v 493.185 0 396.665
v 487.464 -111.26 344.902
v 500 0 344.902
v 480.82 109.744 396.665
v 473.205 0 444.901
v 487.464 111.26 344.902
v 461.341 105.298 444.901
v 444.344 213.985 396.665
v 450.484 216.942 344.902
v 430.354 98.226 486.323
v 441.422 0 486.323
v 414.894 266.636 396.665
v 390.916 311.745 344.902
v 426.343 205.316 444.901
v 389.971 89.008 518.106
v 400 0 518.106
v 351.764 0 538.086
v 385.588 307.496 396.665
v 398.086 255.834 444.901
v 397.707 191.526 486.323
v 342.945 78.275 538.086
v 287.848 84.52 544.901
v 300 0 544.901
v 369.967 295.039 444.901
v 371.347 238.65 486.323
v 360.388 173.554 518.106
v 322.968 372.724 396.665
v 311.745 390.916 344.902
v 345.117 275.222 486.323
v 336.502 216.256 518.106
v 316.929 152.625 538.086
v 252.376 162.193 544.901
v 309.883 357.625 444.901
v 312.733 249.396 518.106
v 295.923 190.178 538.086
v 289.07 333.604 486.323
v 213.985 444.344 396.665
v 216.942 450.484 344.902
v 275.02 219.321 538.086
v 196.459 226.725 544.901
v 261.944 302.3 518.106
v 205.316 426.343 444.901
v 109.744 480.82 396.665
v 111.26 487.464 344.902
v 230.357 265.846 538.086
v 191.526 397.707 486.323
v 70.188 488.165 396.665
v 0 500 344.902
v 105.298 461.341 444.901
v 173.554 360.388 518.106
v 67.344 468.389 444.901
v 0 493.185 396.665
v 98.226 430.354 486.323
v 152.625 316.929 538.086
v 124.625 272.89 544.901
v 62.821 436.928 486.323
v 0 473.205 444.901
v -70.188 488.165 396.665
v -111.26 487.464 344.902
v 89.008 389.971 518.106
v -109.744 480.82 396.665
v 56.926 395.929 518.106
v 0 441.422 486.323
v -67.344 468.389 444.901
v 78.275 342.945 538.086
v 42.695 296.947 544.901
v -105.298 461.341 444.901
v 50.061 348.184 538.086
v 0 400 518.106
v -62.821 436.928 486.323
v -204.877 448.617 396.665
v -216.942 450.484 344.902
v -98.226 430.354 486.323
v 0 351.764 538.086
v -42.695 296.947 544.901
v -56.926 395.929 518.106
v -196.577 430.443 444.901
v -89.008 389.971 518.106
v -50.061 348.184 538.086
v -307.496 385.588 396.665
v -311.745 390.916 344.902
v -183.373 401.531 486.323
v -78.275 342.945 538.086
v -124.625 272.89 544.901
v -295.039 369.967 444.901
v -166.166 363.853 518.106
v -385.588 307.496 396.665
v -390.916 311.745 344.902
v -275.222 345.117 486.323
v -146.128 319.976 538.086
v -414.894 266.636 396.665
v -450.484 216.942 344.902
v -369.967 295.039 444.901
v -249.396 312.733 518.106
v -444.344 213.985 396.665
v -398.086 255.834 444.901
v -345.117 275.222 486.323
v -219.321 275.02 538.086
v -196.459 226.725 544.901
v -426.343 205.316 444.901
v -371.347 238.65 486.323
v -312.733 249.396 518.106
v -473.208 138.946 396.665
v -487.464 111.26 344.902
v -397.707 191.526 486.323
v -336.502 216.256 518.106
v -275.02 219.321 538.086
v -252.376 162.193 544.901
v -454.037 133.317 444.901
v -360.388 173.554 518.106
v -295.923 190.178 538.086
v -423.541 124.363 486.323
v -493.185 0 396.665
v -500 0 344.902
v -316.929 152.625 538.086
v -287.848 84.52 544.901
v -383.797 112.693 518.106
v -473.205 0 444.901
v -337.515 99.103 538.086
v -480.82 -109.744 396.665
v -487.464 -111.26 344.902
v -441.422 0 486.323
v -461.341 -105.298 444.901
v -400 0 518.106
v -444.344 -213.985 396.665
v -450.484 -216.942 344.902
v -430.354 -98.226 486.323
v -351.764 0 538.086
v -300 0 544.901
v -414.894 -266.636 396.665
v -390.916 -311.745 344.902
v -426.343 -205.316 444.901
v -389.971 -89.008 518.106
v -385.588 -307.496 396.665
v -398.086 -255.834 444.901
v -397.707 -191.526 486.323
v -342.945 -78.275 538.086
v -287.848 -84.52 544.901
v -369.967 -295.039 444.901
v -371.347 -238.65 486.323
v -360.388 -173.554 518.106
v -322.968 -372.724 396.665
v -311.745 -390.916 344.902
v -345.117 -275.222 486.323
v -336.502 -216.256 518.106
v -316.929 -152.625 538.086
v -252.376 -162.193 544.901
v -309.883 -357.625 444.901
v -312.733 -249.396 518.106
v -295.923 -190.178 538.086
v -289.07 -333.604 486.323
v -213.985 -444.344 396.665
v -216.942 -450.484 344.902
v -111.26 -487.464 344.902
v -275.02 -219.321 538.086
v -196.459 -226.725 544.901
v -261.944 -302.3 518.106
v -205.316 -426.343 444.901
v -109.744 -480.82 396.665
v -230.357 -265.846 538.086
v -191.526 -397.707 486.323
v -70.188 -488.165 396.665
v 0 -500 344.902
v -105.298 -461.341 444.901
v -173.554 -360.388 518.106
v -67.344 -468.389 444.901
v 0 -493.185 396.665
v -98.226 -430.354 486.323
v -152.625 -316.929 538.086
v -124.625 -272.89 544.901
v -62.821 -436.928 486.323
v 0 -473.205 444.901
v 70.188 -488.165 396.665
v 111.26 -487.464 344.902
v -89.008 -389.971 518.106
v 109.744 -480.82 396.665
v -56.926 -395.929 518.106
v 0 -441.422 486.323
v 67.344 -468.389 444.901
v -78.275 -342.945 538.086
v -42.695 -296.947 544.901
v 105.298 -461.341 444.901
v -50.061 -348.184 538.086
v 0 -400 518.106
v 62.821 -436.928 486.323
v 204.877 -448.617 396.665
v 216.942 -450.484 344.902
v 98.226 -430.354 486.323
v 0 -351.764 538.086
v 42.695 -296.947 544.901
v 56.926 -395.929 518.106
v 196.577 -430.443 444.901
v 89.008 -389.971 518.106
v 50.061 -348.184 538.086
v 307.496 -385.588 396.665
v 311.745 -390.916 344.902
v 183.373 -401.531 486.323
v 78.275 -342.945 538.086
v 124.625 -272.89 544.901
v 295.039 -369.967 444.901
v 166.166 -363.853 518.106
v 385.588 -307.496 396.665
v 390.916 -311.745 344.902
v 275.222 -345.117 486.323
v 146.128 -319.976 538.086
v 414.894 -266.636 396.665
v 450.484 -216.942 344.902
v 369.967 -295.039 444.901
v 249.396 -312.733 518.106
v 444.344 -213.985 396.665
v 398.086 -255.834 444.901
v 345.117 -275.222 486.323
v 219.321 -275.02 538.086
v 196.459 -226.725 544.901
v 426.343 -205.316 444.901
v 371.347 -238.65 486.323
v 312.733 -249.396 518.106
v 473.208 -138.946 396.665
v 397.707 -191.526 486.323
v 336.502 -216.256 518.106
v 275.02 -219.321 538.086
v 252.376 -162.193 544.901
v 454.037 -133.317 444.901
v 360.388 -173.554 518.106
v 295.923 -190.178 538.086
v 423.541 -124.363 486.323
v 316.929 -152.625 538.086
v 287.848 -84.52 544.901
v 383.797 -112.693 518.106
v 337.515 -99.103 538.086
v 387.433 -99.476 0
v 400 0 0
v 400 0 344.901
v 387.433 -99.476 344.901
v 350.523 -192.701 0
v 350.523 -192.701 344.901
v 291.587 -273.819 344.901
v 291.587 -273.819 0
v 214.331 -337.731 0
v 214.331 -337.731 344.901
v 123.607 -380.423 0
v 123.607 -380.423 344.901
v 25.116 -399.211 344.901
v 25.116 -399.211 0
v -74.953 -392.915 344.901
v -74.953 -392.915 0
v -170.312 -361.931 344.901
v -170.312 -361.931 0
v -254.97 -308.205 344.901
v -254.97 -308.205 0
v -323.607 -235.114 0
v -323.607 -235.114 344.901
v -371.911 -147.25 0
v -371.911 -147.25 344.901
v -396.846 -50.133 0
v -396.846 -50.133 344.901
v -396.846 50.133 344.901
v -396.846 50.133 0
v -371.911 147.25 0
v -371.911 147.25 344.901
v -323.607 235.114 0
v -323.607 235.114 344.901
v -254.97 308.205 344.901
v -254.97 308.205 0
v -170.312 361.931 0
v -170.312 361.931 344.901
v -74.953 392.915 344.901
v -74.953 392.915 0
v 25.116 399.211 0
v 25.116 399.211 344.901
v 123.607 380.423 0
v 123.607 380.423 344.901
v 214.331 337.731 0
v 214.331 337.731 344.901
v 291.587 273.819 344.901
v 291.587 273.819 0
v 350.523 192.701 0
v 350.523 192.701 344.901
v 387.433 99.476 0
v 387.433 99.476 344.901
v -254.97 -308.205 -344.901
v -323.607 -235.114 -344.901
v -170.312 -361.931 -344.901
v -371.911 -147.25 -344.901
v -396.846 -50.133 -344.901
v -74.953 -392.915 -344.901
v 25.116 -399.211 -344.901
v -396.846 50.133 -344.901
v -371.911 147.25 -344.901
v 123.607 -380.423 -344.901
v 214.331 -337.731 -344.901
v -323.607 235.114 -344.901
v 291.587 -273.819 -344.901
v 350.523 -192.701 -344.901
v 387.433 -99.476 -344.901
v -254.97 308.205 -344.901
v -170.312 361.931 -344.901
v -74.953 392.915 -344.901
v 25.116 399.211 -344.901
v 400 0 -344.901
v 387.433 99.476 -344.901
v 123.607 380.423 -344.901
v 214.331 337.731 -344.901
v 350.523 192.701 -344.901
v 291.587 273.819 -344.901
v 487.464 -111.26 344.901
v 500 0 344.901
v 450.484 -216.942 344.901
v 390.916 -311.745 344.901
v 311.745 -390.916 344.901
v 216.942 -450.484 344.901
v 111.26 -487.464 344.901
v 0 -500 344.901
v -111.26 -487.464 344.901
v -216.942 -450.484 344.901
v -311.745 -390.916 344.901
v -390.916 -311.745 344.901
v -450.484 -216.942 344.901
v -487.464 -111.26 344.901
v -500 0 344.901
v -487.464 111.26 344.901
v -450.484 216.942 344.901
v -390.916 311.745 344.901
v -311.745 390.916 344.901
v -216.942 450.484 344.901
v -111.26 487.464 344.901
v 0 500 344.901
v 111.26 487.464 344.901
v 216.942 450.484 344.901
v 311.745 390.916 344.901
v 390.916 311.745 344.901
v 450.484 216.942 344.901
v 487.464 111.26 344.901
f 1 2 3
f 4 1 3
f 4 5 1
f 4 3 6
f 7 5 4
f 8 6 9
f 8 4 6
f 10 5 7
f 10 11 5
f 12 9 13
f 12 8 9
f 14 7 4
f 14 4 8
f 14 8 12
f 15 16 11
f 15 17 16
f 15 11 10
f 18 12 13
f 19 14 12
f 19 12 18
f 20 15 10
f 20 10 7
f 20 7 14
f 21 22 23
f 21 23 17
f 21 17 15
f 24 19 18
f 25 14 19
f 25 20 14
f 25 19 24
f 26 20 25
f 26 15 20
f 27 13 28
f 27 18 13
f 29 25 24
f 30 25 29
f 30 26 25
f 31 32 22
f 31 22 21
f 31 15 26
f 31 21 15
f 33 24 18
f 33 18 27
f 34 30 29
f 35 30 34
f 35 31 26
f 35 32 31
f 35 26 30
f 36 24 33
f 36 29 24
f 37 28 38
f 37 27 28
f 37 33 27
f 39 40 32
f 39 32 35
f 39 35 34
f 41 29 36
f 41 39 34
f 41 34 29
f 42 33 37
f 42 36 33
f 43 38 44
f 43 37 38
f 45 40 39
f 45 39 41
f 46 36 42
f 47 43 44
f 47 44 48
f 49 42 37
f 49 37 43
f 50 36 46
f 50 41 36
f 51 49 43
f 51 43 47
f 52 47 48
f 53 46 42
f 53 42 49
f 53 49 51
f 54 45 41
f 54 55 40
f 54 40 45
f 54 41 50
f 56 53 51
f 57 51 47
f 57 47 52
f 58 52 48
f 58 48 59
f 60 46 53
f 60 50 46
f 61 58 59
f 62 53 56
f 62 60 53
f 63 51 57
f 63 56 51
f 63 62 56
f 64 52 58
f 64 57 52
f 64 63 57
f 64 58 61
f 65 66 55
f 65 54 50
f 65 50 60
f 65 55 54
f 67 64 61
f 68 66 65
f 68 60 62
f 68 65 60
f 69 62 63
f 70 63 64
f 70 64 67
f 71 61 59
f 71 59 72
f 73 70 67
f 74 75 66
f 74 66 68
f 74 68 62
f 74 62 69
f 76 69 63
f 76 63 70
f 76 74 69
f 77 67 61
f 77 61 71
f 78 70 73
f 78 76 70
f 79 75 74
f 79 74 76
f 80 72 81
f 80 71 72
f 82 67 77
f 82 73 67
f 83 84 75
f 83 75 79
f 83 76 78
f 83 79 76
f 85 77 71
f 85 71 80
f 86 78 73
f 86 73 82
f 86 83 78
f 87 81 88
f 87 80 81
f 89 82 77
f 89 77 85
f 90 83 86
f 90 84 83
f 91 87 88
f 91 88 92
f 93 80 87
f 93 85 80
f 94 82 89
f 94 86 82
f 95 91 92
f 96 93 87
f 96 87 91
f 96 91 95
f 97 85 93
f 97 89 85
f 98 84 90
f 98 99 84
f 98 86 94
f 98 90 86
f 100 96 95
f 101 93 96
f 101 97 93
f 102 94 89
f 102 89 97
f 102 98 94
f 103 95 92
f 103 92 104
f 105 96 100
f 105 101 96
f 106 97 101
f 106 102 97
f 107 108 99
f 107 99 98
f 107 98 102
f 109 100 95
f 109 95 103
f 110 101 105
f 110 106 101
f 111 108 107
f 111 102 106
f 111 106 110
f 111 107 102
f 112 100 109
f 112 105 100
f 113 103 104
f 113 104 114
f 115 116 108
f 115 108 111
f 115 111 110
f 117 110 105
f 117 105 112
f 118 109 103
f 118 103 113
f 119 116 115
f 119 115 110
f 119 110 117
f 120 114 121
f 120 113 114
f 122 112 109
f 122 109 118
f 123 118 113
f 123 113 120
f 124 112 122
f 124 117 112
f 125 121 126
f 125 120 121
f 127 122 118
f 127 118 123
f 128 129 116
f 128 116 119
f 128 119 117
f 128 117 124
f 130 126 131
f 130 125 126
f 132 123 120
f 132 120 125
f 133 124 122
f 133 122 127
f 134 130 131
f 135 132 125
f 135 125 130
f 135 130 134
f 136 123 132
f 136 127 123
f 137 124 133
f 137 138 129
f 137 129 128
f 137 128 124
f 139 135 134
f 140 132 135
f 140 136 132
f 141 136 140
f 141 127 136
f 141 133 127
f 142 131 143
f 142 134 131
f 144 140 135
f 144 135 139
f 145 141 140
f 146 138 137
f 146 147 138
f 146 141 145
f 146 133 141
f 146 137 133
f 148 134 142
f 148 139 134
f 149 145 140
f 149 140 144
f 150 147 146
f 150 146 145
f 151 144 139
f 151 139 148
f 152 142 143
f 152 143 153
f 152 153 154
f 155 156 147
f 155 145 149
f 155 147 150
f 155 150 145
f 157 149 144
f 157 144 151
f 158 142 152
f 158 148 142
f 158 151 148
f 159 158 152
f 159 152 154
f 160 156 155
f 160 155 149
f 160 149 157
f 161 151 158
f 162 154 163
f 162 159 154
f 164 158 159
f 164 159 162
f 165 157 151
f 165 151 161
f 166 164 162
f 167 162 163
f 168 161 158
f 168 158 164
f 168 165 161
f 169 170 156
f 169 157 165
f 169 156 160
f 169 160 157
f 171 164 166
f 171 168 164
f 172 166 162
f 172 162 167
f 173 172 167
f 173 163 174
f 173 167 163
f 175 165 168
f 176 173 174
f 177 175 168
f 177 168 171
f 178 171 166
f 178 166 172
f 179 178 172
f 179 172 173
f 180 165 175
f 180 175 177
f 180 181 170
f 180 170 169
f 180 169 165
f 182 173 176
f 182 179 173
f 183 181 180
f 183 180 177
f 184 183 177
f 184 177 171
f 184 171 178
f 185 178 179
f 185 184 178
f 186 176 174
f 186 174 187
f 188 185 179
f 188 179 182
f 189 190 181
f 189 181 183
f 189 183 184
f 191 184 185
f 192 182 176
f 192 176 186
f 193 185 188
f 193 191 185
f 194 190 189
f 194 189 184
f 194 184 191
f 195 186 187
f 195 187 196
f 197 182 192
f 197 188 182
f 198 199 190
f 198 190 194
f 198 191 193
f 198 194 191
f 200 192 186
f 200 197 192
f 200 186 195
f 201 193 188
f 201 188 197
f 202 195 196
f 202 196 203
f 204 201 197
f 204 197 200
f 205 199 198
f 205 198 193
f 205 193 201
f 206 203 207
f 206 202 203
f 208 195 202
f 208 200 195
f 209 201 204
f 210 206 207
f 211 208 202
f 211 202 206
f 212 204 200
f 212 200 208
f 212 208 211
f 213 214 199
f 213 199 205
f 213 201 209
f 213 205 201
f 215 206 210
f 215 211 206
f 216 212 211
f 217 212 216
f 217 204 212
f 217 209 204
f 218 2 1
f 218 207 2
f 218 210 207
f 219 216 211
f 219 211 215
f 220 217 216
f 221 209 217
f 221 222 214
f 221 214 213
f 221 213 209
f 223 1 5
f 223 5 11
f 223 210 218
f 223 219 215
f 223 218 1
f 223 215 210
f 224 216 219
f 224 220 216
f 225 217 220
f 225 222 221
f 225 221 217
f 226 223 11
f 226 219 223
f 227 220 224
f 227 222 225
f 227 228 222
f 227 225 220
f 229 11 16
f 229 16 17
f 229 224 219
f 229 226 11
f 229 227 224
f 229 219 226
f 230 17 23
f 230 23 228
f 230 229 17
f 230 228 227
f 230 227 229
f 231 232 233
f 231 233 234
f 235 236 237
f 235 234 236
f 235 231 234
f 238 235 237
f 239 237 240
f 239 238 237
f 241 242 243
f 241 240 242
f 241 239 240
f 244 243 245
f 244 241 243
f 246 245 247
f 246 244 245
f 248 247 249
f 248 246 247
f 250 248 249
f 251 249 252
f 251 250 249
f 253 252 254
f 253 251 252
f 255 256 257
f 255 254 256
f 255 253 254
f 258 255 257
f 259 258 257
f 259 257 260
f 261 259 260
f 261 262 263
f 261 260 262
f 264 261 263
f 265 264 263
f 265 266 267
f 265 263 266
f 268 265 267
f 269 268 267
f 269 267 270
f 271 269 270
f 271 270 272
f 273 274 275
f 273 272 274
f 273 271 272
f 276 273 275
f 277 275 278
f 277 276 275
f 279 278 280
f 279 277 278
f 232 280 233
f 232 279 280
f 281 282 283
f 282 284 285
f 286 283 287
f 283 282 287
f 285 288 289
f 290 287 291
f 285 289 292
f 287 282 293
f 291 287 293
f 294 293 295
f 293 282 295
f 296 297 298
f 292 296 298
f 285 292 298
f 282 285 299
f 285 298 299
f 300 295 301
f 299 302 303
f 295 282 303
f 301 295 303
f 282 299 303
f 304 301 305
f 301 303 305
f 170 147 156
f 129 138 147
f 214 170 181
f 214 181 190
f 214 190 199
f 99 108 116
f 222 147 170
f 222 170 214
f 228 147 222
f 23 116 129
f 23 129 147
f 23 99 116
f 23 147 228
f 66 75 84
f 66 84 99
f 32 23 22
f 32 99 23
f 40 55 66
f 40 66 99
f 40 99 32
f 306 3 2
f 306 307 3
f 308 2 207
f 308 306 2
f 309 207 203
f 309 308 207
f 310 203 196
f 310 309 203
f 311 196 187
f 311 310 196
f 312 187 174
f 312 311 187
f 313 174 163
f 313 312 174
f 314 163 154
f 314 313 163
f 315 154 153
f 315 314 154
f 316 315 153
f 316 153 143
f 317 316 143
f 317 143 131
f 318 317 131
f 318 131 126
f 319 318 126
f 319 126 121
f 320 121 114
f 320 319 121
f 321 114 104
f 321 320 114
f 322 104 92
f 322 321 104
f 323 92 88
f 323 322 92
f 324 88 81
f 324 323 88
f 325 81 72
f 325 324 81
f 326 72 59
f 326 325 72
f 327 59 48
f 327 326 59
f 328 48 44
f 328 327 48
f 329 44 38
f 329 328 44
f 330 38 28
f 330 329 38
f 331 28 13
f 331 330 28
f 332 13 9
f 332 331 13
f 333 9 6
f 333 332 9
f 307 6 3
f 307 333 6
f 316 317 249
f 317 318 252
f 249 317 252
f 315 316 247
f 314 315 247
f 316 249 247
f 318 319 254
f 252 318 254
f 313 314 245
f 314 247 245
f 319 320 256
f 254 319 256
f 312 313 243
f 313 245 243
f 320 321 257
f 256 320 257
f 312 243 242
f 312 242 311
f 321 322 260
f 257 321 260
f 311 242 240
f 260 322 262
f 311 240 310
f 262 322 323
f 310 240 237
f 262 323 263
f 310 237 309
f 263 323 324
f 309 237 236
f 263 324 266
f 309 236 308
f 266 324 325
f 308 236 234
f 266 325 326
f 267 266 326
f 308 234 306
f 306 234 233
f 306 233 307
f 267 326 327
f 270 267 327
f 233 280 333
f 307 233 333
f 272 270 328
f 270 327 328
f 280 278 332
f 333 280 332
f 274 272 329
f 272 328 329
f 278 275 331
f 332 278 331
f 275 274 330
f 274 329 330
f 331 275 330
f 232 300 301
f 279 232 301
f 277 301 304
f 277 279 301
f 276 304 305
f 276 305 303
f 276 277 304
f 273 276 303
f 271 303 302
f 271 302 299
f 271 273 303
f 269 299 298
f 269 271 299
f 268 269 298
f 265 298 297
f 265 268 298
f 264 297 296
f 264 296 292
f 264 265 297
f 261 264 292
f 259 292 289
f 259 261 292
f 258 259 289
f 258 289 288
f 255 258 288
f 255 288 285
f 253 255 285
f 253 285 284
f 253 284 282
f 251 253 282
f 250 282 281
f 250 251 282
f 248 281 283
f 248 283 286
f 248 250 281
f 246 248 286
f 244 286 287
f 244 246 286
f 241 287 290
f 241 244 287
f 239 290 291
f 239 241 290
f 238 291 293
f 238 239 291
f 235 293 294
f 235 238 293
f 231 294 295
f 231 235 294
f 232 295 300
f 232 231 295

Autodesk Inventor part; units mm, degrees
ref_plane "YZ Plane" through (0, 0, 0) normal (1, 0, 0) x (0, 1, 0)
ref_plane "XZ Plane" through (0, 0, 0) normal (0, 1, 0) x (-1, 0, 0)
ref_plane "XY Plane" through (0, 0, 0) normal (0, 0, 1) x (1, 0, 0)
sketch "Sketch1" plane through (0, 0, 0) normal (0, 0, 1) x (1, 0, 0)
  circle A0 centre (0, 0) radius 400
  dimension "d0" = 800
extrude "Extrusion1" add sketch "Sketch1" along normal mid plane 689.802
sketch "Sketch2" plane through (0, 0, 344.901) normal (0, 0, 1) x (1, 0, 0)
  circle A0 centre (0, 0) radius 500
  dimension "d3" = 1000
extrude "Extrusion2" add sketch "Sketch2" along normal blind 200
fillet "Fillet1" radius 200 1 edges at (-500, 0, 544.901)
properties part number "06_LastArmChop"
